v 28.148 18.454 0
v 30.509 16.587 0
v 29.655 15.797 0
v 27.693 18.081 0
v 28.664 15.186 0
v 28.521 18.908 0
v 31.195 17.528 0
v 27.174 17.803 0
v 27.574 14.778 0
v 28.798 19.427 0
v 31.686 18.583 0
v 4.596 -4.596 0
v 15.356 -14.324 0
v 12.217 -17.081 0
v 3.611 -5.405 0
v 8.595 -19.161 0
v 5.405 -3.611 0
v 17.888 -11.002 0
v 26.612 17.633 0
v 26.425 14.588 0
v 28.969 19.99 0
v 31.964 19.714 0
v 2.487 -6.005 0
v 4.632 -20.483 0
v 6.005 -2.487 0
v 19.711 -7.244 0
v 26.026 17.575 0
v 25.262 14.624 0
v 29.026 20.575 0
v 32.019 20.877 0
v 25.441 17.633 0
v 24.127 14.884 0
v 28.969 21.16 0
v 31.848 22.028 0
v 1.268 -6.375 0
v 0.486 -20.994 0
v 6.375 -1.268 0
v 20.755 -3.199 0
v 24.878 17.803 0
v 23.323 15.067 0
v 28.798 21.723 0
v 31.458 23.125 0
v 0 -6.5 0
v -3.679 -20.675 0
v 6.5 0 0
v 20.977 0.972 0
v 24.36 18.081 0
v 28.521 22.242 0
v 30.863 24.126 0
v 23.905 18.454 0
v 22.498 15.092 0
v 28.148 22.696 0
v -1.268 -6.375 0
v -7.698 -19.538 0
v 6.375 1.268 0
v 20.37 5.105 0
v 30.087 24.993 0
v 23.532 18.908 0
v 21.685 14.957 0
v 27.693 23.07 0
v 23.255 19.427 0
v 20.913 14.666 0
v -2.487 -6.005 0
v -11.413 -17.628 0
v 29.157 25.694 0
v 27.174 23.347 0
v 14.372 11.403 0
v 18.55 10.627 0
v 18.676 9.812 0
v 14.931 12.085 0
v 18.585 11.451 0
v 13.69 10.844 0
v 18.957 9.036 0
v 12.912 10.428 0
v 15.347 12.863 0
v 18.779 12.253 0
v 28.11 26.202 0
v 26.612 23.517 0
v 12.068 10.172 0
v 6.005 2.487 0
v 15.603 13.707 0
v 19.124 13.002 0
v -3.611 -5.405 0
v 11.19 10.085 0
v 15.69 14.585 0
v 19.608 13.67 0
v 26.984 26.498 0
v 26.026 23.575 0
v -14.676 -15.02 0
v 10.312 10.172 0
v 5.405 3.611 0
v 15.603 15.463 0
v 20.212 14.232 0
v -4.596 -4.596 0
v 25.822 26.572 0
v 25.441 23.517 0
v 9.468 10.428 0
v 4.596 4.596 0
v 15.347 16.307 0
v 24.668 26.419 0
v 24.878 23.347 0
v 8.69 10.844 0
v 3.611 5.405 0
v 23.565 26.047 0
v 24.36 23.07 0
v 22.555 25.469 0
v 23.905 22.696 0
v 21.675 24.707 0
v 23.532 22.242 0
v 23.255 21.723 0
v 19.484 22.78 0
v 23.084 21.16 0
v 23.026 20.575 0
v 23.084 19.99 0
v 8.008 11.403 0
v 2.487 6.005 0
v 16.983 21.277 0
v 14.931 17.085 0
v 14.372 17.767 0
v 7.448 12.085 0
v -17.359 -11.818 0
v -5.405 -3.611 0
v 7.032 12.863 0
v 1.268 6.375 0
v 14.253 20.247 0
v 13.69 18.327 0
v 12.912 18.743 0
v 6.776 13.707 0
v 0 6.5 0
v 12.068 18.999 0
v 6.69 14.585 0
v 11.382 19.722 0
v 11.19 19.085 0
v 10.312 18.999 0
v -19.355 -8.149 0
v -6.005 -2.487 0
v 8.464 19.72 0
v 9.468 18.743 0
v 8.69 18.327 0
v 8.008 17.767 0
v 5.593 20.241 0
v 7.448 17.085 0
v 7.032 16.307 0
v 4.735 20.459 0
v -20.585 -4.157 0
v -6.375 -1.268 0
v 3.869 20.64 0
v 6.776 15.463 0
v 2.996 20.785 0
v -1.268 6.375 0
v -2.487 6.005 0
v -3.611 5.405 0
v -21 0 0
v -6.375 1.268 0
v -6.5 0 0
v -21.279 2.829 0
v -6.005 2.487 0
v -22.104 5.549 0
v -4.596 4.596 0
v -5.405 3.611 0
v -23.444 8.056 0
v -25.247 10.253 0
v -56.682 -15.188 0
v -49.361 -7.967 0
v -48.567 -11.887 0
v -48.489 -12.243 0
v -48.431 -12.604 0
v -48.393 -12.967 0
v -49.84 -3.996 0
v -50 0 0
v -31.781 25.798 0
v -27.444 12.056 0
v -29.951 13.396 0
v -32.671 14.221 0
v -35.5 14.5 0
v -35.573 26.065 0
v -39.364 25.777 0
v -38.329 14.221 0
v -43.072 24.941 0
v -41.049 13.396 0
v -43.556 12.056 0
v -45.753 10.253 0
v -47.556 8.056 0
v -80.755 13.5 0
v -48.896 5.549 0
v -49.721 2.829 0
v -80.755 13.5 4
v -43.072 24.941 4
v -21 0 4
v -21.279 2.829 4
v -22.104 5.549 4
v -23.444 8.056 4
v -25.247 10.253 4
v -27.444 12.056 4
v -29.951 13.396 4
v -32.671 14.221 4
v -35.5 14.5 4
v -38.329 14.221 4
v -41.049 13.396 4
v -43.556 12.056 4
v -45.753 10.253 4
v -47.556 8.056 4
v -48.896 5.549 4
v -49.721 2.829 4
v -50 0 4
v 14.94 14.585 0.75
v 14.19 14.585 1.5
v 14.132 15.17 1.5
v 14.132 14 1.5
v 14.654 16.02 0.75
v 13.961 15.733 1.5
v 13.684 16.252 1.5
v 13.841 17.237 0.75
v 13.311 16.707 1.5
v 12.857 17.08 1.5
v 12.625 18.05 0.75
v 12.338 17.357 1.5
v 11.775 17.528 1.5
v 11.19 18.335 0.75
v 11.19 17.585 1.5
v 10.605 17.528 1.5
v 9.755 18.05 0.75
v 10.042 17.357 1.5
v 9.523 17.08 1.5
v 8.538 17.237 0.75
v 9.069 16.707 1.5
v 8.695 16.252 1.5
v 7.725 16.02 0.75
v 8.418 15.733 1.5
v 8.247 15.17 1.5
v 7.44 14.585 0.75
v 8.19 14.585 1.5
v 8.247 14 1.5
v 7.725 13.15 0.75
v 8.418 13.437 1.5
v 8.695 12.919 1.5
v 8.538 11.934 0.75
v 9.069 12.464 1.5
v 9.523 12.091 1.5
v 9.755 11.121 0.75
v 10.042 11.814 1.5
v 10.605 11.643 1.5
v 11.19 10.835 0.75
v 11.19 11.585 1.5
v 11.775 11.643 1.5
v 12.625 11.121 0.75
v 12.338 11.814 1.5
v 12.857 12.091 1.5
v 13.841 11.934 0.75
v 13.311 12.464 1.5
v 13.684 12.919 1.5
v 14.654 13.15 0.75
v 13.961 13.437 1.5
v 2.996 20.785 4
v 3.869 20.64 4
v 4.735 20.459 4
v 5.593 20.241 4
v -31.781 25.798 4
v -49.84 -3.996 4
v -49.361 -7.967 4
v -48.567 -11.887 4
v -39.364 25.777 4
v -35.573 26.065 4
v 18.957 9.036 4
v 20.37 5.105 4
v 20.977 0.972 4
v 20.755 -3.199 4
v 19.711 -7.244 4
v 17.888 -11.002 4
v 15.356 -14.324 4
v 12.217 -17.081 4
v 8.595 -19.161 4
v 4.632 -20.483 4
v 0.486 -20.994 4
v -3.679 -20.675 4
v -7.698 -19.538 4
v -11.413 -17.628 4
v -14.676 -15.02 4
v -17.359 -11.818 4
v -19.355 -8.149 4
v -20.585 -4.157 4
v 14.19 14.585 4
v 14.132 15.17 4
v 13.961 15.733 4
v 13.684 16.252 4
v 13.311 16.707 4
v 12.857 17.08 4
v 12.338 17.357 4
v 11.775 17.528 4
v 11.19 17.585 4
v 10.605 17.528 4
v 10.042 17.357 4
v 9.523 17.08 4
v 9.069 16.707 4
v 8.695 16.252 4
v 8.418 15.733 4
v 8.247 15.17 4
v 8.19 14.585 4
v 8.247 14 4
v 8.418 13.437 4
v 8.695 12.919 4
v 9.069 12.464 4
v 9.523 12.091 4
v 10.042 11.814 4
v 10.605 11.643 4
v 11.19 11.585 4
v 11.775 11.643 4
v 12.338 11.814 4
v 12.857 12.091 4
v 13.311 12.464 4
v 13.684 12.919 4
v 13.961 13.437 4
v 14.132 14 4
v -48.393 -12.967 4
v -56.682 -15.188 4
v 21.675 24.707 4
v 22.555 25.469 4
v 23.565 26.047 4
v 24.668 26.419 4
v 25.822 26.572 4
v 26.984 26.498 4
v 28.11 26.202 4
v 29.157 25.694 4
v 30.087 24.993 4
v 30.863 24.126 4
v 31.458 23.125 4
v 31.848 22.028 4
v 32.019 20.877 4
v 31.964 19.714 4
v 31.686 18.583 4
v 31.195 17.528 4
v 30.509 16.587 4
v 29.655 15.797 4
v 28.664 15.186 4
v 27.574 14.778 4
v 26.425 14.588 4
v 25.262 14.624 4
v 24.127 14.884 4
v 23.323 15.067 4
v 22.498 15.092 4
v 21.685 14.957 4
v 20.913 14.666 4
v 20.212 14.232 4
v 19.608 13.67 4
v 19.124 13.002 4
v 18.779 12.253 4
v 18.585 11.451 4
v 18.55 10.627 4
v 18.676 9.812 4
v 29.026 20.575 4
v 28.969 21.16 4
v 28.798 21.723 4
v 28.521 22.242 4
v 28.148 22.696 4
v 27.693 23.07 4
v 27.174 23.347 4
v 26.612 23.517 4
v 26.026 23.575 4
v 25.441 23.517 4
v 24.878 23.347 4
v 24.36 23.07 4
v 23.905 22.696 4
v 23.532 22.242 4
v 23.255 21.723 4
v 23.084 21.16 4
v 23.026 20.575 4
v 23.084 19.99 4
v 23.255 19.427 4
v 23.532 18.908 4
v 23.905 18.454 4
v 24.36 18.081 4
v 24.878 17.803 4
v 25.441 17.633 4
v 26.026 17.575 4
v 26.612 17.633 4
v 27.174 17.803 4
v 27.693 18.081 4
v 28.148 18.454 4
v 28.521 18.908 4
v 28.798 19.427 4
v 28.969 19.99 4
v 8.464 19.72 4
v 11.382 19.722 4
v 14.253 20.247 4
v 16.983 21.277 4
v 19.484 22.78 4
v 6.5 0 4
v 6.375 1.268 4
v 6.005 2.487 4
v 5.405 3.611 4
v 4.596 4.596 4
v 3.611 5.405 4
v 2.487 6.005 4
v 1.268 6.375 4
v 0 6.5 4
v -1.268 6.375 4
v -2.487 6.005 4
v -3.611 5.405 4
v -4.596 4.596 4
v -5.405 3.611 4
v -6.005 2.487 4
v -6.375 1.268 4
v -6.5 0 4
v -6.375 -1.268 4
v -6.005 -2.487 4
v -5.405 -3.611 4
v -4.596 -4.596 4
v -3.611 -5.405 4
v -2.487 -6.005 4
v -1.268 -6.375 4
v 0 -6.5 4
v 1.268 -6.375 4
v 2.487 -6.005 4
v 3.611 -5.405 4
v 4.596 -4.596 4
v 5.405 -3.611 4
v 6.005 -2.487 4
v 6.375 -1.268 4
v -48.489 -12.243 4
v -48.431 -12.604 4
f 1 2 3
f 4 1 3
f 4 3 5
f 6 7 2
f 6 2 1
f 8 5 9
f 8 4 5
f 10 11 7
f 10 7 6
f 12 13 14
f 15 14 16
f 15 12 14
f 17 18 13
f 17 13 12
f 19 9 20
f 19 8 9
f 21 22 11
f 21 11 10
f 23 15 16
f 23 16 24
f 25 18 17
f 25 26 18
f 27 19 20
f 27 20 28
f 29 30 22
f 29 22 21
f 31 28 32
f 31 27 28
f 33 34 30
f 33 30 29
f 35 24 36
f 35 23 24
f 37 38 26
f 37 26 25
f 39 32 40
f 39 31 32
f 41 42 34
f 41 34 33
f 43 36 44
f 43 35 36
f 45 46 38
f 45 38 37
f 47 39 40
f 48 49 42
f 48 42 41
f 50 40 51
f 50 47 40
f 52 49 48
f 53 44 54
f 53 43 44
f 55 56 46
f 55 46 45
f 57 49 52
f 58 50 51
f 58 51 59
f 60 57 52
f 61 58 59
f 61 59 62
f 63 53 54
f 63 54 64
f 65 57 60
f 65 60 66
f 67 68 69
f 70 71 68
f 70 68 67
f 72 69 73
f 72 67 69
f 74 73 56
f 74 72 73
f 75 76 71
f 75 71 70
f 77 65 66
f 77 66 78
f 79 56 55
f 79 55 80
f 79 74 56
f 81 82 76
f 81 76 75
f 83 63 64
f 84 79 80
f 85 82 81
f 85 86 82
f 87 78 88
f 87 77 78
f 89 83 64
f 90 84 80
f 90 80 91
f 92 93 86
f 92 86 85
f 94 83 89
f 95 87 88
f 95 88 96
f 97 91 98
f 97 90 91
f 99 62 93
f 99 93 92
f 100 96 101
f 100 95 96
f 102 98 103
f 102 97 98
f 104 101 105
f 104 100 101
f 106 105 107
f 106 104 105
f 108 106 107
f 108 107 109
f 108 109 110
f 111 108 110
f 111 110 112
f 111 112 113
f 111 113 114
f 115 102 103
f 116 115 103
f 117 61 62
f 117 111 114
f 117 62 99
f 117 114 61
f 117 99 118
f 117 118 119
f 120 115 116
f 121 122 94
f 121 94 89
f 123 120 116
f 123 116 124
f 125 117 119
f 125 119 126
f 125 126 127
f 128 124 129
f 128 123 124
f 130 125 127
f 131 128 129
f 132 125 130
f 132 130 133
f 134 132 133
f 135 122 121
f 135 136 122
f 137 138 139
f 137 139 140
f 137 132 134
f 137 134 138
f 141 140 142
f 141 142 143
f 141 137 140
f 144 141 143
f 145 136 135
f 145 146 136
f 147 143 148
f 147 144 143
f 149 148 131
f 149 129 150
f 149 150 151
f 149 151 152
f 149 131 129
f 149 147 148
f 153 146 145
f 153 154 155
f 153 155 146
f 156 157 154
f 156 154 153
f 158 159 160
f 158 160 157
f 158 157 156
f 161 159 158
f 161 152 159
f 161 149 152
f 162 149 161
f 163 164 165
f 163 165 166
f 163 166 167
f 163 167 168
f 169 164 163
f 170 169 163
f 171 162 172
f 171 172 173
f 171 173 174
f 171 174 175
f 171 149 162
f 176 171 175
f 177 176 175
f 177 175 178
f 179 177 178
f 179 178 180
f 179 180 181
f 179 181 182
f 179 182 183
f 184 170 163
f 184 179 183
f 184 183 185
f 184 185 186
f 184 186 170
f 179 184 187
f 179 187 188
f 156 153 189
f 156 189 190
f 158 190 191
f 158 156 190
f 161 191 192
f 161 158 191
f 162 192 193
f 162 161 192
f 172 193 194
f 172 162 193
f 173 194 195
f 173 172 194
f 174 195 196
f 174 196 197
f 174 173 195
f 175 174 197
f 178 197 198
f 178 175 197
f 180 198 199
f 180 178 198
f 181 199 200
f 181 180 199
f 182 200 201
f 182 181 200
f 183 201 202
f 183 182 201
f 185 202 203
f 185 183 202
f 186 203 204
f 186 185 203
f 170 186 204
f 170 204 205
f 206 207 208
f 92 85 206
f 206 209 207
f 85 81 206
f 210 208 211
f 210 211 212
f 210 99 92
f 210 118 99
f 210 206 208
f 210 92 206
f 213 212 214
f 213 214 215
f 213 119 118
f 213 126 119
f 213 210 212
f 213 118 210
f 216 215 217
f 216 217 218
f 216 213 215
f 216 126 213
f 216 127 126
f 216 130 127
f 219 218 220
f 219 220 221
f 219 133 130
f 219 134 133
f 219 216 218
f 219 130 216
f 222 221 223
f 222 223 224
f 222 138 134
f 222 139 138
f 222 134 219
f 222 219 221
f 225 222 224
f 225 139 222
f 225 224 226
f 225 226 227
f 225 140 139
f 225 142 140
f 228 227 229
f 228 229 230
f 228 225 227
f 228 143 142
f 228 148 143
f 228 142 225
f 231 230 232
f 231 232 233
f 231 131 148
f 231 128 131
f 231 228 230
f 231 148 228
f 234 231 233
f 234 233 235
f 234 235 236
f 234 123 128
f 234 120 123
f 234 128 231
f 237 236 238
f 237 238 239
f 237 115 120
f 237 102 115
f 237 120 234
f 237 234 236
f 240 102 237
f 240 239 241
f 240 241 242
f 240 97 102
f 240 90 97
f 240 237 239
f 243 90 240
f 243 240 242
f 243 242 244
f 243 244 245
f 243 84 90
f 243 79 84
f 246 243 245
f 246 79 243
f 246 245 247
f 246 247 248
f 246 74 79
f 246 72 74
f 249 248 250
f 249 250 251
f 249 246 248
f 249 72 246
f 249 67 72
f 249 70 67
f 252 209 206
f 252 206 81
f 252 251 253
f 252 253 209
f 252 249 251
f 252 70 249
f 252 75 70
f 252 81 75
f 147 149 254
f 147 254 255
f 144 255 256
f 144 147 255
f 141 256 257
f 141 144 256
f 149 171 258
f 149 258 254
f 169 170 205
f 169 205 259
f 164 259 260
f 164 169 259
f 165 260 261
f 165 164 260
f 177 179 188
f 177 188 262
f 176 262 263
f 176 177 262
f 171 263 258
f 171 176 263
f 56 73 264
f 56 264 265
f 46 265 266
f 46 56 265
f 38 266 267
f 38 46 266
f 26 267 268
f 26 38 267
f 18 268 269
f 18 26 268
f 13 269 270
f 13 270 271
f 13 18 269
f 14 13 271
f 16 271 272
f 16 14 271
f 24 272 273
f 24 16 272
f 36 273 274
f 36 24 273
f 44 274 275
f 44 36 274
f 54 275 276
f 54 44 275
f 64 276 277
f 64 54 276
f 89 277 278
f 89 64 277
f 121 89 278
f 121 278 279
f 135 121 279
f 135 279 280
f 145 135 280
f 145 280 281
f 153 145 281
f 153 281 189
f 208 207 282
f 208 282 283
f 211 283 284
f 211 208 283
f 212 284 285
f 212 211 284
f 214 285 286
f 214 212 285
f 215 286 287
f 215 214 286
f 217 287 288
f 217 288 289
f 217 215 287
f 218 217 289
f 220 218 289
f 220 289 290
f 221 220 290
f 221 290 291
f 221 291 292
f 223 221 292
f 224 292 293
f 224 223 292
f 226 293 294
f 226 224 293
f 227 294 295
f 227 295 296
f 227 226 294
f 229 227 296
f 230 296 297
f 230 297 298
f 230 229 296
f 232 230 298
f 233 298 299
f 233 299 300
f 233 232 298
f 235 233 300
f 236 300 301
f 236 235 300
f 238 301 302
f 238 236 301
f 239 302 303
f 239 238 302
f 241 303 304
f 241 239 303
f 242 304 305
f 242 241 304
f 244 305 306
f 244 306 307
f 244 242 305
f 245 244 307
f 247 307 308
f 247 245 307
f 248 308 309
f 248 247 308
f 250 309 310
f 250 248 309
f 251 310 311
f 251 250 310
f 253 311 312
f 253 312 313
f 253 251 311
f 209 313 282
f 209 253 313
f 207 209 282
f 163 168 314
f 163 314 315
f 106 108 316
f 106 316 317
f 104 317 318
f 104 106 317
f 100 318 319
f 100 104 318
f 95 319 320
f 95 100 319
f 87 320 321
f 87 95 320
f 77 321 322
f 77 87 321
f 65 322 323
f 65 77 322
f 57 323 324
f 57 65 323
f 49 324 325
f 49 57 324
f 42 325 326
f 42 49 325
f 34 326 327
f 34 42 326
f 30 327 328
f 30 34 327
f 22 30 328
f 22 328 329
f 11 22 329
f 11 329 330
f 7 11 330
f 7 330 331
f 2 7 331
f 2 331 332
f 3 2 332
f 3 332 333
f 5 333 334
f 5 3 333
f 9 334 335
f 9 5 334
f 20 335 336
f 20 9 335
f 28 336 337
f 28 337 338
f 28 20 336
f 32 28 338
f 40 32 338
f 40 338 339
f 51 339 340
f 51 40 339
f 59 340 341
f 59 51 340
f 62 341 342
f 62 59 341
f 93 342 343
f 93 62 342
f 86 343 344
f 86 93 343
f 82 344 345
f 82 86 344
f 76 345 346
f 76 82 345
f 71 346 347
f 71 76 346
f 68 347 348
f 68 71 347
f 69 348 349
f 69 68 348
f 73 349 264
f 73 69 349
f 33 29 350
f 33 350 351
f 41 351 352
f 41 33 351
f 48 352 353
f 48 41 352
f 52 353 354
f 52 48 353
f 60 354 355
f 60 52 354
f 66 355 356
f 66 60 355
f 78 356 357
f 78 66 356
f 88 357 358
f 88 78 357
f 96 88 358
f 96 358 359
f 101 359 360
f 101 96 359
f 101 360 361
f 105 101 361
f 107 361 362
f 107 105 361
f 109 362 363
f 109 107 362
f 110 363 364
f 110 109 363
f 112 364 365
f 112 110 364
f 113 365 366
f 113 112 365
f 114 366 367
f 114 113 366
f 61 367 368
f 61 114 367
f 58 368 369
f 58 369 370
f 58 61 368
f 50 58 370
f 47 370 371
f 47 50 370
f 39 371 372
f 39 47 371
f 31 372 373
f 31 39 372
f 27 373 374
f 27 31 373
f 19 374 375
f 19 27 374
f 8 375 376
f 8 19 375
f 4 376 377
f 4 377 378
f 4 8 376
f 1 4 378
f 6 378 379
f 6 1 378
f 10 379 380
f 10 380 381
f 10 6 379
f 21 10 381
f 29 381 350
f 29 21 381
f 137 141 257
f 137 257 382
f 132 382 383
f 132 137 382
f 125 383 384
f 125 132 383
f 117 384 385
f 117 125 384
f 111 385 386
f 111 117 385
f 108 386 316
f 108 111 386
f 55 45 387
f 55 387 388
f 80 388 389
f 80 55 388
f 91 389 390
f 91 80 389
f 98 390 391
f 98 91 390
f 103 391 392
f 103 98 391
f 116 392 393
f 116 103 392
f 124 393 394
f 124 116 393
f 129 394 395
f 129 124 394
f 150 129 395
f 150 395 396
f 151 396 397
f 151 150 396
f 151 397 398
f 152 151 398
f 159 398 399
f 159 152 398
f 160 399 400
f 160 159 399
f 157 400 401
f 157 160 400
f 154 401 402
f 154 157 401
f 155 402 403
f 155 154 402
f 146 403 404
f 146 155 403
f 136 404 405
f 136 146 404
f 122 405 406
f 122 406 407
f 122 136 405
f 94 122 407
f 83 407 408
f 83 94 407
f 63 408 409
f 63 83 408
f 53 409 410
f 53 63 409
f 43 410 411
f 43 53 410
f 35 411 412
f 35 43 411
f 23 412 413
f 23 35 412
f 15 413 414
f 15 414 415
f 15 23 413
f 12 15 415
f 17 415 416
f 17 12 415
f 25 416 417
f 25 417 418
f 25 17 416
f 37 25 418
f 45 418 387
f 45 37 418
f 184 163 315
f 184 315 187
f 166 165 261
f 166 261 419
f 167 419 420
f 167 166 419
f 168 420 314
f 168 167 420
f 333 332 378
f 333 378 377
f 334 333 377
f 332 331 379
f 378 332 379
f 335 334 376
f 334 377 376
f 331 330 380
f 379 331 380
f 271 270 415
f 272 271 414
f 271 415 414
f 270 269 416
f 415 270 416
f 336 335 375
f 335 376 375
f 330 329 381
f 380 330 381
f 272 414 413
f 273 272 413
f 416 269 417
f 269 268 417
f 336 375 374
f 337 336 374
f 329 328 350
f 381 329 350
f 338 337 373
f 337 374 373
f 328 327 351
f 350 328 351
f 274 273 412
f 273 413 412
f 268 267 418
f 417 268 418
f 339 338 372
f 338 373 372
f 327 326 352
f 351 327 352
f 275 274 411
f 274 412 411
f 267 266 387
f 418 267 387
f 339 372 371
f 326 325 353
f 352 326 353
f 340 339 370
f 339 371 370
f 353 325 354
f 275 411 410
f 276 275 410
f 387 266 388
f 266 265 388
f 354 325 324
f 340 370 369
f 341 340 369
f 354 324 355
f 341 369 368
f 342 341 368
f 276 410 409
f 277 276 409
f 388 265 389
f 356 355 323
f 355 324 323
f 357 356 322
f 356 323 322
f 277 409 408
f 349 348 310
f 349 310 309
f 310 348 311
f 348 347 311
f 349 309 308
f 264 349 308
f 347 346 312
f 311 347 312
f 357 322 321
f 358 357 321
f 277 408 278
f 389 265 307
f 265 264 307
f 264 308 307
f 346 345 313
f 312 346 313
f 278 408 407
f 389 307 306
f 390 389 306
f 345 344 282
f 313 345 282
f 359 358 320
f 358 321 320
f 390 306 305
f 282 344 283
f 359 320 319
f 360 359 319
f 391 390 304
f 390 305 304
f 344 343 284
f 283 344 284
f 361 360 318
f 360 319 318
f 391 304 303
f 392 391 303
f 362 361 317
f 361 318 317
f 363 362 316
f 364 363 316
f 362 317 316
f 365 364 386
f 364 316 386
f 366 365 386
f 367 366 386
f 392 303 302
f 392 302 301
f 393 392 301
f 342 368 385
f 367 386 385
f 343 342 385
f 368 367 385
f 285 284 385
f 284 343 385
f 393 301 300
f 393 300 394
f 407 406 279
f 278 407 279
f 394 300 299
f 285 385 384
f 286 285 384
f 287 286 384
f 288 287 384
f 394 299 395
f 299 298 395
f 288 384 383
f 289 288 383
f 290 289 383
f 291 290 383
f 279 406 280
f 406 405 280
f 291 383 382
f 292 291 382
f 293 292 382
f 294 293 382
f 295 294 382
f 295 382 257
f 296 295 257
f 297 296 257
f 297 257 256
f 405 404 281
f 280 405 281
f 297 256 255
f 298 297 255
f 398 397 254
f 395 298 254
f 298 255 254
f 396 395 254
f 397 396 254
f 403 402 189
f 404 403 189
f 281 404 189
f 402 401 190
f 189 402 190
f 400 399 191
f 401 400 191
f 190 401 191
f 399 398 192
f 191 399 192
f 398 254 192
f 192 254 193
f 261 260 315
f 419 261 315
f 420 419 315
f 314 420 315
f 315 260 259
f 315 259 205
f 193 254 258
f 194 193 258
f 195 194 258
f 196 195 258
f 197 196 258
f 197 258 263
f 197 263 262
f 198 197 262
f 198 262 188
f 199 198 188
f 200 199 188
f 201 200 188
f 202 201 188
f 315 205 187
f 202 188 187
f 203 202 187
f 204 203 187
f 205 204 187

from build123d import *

# Parameters (mm, degrees)
SKETCH_1_R             = 3
SKETCH_1_R_2           = 6.5
SM_BASE_FLANGE_1_DEPTH = 4
CHAMFER_2_SIZE         = 1.5


# Sheet-metal steps are written as plain solids
with BuildPart() as part:
    # Sketch 1 → Базовая кромка1 (new body)
    with BuildSketch(Plane.XY):
        with BuildLine():
            Line((-31.781350826, 25.798136577), (2.996060756, 20.785177891))
            ThreePointArc((2.996060756, 20.785177891), (4.303188162, 20.554380838), (5.593123802, 20.241466502))
            ThreePointArc((5.593123802, 20.241466502), (14.252686638, 20.246803625), (21.67545772, 24.706683273))
            ThreePointArc((21.67545772, 24.706683273), (31.84775804, 22.028007779), (24.127078994, 14.883631579))
            ThreePointArc((24.127078994, 14.883631579), (19.607693171, 13.67003856), (18.956512096, 9.036074875))
            ThreePointArc((18.956512096, 9.036074875), (4.632129423, -20.482758042), (-21, 0))
            ThreePointArc((-21, 0), (-35.5, 14.5), (-50, 0))
            ThreePointArc((-50, 0), (-49.640340933, -5.986363846), (-48.566537916, -11.88660569))
            ThreePointArc((-48.566537916, -11.88660569), (-48.457937157, -12.423224233), (-48.39294532, -12.966850618))
            Line((-48.39294532, -12.966850618), (-56.68245323, -15.188017568))
            Line((-56.68245323, -15.188017568), (-80.754558191, 13.5))
            Line((-80.754558191, 13.5), (-43.07213712, 24.940628339))
            ThreePointArc((-43.07213712, 24.940628339), (-37.473872446, 25.989921702), (-31.781350826, 25.798136577))
        make_face()
        with Locations((11.189842551, 14.585216118)):
            Circle(SKETCH_1_R, mode=Mode.SUBTRACT)
        Circle(SKETCH_1_R_2, mode=Mode.SUBTRACT)
        with Locations((26.026325977, 20.575104227)):
            Circle(SKETCH_1_R, mode=Mode.SUBTRACT)
    extrude(amount=SM_BASE_FLANGE_1_DEPTH)

    # Фаска2
    chamfer_2_edges = [part.edges().sort_by_distance(p)[0] for p in [
        (8.189842551, 14.585216118, 0),
    ]]
    chamfer(chamfer_2_edges, length=CHAMFER_2_SIZE)


solid = part.part
